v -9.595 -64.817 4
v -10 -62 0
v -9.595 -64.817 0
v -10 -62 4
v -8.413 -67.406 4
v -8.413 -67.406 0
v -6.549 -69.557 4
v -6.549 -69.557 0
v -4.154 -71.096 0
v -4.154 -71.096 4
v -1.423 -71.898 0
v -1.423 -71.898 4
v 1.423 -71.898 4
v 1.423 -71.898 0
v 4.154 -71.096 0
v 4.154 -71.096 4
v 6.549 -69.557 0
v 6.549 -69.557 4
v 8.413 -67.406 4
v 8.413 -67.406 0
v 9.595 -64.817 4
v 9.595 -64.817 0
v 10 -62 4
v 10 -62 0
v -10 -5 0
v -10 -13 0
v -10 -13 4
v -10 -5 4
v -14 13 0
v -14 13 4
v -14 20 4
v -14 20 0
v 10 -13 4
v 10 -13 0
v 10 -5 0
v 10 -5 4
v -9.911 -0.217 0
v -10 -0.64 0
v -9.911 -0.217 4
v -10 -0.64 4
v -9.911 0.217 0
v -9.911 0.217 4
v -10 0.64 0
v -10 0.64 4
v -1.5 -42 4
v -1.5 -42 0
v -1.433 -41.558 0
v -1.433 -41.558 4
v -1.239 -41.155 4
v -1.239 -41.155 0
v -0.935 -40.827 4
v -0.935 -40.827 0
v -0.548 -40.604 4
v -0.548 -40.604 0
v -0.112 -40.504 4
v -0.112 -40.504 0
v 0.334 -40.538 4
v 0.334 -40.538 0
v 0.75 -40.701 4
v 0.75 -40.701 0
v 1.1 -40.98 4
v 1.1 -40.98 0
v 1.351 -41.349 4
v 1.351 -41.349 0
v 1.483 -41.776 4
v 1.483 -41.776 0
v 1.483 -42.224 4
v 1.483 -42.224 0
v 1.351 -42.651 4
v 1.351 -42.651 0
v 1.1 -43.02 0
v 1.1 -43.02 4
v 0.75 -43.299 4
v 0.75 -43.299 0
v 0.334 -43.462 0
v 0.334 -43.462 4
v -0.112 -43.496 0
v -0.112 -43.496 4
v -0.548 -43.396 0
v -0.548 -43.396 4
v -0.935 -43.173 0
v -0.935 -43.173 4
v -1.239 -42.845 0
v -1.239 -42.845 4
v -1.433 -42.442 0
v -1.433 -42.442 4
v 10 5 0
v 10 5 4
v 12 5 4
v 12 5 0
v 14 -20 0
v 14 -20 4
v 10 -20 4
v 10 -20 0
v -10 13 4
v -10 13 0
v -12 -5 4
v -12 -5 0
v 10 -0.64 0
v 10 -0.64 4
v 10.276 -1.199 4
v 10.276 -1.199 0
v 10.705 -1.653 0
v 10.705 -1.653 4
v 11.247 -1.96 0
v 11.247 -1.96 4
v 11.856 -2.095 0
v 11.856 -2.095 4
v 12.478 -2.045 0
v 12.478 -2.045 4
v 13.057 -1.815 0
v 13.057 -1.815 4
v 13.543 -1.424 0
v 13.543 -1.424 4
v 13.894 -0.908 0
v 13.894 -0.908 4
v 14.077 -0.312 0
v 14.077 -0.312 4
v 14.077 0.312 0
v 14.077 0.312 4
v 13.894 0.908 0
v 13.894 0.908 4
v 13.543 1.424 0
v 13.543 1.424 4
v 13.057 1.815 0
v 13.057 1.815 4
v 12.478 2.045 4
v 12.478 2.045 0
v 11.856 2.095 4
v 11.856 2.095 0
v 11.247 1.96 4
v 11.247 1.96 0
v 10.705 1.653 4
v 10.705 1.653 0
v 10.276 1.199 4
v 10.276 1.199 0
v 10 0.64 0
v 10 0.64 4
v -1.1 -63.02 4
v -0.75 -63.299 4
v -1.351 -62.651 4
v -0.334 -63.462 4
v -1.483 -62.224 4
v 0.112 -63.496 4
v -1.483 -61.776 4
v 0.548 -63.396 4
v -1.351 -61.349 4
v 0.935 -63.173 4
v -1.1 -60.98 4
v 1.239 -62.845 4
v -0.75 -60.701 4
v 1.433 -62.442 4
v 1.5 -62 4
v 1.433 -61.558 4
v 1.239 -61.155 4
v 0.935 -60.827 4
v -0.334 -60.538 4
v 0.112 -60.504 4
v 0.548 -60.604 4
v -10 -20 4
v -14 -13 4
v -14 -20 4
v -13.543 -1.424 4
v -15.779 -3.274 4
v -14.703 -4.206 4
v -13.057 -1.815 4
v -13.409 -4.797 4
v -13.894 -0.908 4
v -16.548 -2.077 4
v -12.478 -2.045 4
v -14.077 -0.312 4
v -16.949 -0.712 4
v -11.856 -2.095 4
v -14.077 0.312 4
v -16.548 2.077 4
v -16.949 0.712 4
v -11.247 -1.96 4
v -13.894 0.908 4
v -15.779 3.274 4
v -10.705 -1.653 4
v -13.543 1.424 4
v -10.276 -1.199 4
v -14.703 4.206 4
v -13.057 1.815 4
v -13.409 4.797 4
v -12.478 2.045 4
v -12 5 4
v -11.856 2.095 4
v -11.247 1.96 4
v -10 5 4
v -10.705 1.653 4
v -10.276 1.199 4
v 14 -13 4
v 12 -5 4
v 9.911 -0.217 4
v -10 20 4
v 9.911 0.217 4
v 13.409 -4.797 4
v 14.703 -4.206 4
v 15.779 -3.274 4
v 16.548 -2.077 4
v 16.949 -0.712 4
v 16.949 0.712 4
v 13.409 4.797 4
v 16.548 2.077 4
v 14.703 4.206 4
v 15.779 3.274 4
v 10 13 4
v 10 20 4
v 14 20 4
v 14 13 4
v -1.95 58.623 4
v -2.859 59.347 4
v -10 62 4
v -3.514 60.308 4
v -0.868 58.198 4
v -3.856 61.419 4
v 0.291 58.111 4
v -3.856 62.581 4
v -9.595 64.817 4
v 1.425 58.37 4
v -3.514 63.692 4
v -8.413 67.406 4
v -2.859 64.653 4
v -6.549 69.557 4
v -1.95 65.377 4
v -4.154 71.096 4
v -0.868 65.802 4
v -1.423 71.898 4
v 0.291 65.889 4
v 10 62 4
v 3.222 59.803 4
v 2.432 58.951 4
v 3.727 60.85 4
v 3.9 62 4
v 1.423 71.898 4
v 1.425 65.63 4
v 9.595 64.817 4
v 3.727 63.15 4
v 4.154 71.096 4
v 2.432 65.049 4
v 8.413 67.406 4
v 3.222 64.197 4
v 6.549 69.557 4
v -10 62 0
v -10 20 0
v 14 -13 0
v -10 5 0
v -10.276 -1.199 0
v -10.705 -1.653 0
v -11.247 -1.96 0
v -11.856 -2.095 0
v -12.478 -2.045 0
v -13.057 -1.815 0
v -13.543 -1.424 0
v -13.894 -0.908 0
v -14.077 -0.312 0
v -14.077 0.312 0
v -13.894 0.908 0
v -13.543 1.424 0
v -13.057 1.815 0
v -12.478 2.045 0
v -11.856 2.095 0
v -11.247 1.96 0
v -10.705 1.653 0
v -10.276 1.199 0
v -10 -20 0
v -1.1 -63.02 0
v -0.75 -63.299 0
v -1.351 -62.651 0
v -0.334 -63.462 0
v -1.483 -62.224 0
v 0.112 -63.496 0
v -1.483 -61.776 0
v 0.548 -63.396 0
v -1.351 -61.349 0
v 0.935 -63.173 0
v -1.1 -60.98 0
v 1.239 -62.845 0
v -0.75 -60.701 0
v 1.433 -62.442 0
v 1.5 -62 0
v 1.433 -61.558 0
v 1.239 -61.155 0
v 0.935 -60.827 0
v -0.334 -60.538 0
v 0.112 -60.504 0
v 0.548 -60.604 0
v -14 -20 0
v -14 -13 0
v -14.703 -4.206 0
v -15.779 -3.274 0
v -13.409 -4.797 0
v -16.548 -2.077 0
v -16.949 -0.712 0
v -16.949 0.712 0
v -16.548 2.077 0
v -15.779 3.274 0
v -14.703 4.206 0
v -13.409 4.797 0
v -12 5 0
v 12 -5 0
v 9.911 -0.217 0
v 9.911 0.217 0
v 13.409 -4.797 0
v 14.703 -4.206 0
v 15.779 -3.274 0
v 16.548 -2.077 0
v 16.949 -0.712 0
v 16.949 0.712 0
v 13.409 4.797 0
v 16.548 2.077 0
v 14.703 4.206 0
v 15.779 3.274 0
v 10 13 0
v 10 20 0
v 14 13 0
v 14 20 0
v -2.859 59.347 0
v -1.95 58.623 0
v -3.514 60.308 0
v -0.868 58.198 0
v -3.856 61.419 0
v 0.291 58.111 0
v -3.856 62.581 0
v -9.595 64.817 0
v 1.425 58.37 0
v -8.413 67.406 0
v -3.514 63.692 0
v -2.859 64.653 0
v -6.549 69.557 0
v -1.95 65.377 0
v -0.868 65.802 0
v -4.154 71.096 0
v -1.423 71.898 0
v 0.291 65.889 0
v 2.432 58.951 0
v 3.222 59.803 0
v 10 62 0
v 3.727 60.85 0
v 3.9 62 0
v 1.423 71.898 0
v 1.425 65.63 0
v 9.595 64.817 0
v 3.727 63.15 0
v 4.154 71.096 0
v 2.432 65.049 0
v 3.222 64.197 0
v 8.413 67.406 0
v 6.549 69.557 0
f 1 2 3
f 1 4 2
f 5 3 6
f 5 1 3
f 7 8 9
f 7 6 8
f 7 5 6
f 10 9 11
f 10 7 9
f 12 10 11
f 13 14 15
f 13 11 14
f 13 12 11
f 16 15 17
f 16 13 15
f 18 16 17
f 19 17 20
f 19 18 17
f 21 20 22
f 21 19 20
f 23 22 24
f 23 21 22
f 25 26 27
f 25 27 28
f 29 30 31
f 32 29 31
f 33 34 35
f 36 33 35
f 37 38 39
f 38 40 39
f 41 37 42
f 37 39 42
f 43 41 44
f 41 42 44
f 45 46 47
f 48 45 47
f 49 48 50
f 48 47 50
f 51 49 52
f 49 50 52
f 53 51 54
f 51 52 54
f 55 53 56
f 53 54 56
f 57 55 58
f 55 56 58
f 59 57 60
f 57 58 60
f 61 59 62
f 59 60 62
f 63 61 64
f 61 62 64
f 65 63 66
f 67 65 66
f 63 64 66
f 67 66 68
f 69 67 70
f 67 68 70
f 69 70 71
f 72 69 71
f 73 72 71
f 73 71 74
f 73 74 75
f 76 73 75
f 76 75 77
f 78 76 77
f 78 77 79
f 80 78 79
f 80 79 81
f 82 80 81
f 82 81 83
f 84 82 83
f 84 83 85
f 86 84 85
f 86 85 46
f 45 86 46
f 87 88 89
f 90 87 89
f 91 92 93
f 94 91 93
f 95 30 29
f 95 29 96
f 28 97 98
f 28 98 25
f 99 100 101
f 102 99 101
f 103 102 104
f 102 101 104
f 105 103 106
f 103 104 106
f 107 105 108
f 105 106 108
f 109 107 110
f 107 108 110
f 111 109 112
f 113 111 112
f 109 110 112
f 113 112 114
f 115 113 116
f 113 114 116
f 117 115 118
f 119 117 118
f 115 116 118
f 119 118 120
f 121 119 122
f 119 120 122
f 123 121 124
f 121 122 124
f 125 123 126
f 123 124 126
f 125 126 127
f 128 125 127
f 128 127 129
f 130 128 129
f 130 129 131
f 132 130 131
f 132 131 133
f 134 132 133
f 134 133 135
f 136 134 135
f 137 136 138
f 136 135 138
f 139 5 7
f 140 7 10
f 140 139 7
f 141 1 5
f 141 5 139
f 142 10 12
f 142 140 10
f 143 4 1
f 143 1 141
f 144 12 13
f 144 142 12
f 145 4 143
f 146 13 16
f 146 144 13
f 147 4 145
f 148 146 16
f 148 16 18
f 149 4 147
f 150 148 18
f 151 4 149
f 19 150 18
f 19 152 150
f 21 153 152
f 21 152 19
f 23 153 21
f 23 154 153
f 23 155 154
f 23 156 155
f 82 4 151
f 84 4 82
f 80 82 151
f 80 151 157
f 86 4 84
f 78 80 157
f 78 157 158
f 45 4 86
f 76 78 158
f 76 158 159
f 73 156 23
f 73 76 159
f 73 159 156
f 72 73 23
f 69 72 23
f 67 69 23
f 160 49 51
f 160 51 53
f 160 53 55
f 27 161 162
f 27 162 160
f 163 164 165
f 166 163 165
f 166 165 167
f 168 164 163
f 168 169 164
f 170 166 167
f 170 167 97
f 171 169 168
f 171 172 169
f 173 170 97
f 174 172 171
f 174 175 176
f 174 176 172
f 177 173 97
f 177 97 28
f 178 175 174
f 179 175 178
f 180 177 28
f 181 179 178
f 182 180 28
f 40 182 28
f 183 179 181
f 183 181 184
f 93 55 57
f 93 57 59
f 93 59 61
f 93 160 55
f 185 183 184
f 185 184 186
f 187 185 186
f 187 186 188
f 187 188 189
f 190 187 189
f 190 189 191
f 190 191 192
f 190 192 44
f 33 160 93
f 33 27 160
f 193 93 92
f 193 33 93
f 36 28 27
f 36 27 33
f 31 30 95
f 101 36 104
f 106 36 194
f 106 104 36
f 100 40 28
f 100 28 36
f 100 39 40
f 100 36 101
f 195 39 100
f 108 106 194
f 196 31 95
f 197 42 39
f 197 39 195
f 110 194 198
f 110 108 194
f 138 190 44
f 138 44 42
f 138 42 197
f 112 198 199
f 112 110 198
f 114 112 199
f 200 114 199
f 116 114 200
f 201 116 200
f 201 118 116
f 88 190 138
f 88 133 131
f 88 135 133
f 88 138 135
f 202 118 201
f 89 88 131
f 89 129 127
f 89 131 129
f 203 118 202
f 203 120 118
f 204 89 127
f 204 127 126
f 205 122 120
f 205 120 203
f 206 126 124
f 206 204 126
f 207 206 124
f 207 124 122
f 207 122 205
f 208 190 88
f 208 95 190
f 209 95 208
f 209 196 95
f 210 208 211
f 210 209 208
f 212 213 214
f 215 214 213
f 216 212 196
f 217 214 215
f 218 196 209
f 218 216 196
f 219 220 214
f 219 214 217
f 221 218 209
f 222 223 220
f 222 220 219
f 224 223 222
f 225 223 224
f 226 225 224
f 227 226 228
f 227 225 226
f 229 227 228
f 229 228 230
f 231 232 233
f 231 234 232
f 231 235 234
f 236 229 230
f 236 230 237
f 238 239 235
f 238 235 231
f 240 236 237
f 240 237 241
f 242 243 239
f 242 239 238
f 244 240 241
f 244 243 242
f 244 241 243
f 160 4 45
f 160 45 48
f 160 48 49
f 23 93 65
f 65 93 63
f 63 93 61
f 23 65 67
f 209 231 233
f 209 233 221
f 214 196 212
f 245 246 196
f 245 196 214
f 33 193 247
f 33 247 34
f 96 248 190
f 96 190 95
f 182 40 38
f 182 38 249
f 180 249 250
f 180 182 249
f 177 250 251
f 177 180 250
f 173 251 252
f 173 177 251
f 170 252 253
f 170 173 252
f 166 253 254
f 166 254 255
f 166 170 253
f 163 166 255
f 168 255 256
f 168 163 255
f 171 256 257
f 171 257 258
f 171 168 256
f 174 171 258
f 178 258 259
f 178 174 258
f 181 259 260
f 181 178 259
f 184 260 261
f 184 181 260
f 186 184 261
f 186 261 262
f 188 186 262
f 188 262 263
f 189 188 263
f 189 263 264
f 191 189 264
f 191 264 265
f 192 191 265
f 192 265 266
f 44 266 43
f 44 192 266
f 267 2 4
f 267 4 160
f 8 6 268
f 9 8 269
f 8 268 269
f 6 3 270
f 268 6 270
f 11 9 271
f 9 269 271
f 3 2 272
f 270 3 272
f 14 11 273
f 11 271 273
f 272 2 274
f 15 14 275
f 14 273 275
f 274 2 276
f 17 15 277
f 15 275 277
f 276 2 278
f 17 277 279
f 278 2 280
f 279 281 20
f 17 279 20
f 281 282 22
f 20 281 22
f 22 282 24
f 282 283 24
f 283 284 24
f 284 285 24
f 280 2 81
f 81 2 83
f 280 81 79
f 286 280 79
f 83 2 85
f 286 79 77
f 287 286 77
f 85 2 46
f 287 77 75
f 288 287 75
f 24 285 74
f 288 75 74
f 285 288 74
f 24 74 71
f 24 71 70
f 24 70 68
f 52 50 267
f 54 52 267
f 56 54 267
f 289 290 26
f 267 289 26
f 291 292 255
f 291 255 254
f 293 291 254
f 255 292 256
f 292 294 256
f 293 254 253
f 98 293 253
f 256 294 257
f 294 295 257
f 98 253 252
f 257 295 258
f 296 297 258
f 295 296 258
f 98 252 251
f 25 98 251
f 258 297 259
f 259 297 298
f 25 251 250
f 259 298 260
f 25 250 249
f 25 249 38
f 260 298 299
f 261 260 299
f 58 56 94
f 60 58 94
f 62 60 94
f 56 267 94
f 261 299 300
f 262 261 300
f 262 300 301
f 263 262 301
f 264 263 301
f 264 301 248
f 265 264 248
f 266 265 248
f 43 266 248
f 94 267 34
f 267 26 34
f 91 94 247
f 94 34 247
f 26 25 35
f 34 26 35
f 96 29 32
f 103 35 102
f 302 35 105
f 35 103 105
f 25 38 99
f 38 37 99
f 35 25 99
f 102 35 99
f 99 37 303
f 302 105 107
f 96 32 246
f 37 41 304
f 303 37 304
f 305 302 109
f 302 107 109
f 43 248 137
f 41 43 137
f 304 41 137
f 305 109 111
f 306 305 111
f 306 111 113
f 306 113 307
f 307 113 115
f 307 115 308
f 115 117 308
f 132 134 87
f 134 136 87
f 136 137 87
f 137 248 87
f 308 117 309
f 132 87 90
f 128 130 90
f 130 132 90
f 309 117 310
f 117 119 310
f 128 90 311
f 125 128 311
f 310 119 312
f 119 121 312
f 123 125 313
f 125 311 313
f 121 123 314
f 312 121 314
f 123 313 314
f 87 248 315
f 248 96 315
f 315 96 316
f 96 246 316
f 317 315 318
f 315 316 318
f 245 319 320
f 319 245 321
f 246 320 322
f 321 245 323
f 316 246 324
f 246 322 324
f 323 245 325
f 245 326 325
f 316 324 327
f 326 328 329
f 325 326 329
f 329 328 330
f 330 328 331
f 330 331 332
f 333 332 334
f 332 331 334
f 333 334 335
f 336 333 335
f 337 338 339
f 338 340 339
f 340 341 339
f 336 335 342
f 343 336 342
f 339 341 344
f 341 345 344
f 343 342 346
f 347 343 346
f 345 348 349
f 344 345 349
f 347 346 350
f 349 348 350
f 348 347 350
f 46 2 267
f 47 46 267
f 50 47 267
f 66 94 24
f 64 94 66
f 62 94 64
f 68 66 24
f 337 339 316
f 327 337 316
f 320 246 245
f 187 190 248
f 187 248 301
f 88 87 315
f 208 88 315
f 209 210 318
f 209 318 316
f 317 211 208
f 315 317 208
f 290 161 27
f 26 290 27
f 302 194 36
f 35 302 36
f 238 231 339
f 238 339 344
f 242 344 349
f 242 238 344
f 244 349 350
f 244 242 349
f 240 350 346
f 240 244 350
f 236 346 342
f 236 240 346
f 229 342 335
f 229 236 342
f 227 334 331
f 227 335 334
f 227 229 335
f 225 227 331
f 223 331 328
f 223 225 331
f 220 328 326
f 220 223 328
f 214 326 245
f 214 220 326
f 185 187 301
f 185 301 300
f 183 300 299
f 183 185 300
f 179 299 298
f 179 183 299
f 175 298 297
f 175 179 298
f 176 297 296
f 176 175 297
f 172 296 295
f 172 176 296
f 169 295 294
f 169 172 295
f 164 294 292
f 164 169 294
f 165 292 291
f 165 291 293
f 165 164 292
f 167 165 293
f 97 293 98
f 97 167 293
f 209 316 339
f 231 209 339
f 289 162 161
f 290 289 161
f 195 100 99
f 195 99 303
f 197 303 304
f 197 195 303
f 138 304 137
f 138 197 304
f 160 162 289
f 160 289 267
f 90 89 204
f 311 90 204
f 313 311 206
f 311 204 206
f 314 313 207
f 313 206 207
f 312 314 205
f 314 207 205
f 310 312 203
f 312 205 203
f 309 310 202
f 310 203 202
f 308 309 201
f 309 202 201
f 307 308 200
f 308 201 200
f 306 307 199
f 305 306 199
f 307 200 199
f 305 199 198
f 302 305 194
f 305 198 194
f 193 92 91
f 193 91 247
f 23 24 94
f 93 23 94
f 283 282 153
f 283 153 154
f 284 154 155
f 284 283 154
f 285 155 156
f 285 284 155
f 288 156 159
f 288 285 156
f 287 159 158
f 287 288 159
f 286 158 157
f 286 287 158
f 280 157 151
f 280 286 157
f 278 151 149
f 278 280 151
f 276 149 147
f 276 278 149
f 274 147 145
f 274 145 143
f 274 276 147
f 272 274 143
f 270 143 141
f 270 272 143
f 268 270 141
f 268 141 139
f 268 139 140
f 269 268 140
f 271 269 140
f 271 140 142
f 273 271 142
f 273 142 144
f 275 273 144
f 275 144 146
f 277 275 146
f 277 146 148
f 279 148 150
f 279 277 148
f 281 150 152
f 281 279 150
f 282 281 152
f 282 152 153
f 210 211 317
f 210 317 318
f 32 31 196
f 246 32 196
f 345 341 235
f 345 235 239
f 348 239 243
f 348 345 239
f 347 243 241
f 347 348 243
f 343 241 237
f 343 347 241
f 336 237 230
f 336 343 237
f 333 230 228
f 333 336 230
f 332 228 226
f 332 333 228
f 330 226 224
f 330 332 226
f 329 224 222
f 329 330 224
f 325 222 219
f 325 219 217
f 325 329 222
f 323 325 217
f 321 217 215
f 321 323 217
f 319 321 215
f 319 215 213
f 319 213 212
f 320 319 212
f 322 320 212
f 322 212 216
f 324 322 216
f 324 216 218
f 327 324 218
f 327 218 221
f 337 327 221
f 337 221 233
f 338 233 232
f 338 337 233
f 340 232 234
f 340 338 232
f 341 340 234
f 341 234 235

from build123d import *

# Parameters (mm, degrees)
ESQUISSE1_W             = 20
ESQUISSE1_H             = 144
ESQUISSE1_R             = 1.5
ESQUISSE1_R_2           = 3.9
BOSS_EXTRU_1_DEPTH      = 4
CONG_1_RADIUS           = 10
CONG_1_LENGTH           = 4
ESQUISSE2_W             = 4
ESQUISSE2_H             = 7
BOSS_EXTRU_2_DEPTH      = 4
ESQUISSE3_R             = 1.5
ENL_V_MAT_EXTRU_1_DEPTH = 75.087785768
CONG_2_RADIUS           = 10
CONG_2_LENGTH           = 4
ESQUISSE4_R             = 2.1
ENL_V_MAT_EXTRU_2_DEPTH = 75.087785768


with BuildPart() as part:
    # Esquisse1 → Boss.-Extru.1 (new body)
    with BuildSketch(Plane.XY):
        Rectangle(ESQUISSE1_W, ESQUISSE1_H)
        with Locations((0, -62)):
            Circle(ESQUISSE1_R, mode=Mode.SUBTRACT)
        with Locations((0, 62)):
            Circle(ESQUISSE1_R_2, mode=Mode.SUBTRACT)
    extrude(amount=BOSS_EXTRU_1_DEPTH)

    # Congé1: full round fillet: the end face becomes a half cylinder, R = half its width
    cong_1_face = Plane((0, 72, 2), x_dir=(0, 0, 1), z_dir=(0, 1, 0))  # on the end face: x along it, z out of the body
    cong_1_slab = cong_1_face.offset(-CONG_1_RADIUS / 2) * Box(CONG_1_LENGTH, 2 * CONG_1_RADIUS, CONG_1_RADIUS, mode=Mode.PRIVATE)  # the body's end, R deep
    cong_1_round = Plane((0, 62, 2), x_dir=(0, 1, 0), z_dir=(0, 0, 1)) * Cylinder(CONG_1_RADIUS, CONG_1_LENGTH, mode=Mode.PRIVATE)  # its axis R under the face
    add(cong_1_slab - cong_1_round, mode=Mode.SUBTRACT)

    # Esquisse2 → Boss.-Extru.2 (add)
    with BuildSketch(Plane.XY.offset(4)):
        with BuildLine():
            Line((-10, 0.640312424), (-10, 5))
            Line((-10, 5), (-12, 5))
            ThreePointArc((-12, 5), (-17, 0), (-12, -5))
            Line((-12, -5), (-10, -5))
            Line((-10, -5), (-10, -0.640312424))
            ThreePointArc((-10, -0.640312424), (-14.1, 0), (-10, 0.640312424))
        make_face()
        with Locations((-12, 16.5)):
            Rectangle(ESQUISSE2_W, ESQUISSE2_H)
        with Locations((-12, -16.5)):
            Rectangle(ESQUISSE2_W, ESQUISSE2_H)
    boss_extru_2 = extrude(amount=-BOSS_EXTRU_2_DEPTH)

    # Esquisse3 → Enlèv. mat.-Extru.1 (cut, through all)
    with BuildSketch(Plane(origin=(0, 0, 0), x_dir=(-1, 0, 0), z_dir=(0, 0, -1))):
        with Locations((0, -42)):
            Circle(ESQUISSE3_R)
    extrude(amount=-ENL_V_MAT_EXTRU_1_DEPTH, mode=Mode.SUBTRACT)

    # Congé2: full round fillet: the end face becomes a half cylinder, R = half its width
    cong_2_face = Plane((0, -72, 2), x_dir=(0, 0, 1), z_dir=(0, -1, 0))  # on the end face: x along it, z out of the body
    cong_2_slab = cong_2_face.offset(-CONG_2_RADIUS / 2) * Box(CONG_2_LENGTH, 2 * CONG_2_RADIUS, CONG_2_RADIUS, mode=Mode.PRIVATE)  # the body's end, R deep
    cong_2_round = Plane((0, -62, 2), x_dir=(0, -1, 0), z_dir=(0, 0, 1)) * Cylinder(CONG_2_RADIUS, CONG_2_LENGTH, mode=Mode.PRIVATE)  # its axis R under the face
    add(cong_2_slab - cong_2_round, mode=Mode.SUBTRACT)

    # Esquisse4 → Enlèv. mat.-Extru.2 (cut, through all)
    with BuildSketch(Plane.XY.offset(4)):
        with Locations((-12, 0)):
            Circle(ESQUISSE4_R)
    enl_v_mat_extru_2 = extrude(amount=-ENL_V_MAT_EXTRU_2_DEPTH, mode=Mode.SUBTRACT)

    # Symétrie1: Boss.-Extru.2, Enlèv. mat.-Extru.2 across plane
    add(boss_extru_2.mirror(Plane(origin=(0, 0, 0), x_dir=(0, 0, 1), z_dir=(1, 0, 0))))
    add(enl_v_mat_extru_2.mirror(Plane(origin=(0, 0, 0), x_dir=(0, 0, 1), z_dir=(1, 0, 0))), mode=Mode.SUBTRACT)


solid = part.part
